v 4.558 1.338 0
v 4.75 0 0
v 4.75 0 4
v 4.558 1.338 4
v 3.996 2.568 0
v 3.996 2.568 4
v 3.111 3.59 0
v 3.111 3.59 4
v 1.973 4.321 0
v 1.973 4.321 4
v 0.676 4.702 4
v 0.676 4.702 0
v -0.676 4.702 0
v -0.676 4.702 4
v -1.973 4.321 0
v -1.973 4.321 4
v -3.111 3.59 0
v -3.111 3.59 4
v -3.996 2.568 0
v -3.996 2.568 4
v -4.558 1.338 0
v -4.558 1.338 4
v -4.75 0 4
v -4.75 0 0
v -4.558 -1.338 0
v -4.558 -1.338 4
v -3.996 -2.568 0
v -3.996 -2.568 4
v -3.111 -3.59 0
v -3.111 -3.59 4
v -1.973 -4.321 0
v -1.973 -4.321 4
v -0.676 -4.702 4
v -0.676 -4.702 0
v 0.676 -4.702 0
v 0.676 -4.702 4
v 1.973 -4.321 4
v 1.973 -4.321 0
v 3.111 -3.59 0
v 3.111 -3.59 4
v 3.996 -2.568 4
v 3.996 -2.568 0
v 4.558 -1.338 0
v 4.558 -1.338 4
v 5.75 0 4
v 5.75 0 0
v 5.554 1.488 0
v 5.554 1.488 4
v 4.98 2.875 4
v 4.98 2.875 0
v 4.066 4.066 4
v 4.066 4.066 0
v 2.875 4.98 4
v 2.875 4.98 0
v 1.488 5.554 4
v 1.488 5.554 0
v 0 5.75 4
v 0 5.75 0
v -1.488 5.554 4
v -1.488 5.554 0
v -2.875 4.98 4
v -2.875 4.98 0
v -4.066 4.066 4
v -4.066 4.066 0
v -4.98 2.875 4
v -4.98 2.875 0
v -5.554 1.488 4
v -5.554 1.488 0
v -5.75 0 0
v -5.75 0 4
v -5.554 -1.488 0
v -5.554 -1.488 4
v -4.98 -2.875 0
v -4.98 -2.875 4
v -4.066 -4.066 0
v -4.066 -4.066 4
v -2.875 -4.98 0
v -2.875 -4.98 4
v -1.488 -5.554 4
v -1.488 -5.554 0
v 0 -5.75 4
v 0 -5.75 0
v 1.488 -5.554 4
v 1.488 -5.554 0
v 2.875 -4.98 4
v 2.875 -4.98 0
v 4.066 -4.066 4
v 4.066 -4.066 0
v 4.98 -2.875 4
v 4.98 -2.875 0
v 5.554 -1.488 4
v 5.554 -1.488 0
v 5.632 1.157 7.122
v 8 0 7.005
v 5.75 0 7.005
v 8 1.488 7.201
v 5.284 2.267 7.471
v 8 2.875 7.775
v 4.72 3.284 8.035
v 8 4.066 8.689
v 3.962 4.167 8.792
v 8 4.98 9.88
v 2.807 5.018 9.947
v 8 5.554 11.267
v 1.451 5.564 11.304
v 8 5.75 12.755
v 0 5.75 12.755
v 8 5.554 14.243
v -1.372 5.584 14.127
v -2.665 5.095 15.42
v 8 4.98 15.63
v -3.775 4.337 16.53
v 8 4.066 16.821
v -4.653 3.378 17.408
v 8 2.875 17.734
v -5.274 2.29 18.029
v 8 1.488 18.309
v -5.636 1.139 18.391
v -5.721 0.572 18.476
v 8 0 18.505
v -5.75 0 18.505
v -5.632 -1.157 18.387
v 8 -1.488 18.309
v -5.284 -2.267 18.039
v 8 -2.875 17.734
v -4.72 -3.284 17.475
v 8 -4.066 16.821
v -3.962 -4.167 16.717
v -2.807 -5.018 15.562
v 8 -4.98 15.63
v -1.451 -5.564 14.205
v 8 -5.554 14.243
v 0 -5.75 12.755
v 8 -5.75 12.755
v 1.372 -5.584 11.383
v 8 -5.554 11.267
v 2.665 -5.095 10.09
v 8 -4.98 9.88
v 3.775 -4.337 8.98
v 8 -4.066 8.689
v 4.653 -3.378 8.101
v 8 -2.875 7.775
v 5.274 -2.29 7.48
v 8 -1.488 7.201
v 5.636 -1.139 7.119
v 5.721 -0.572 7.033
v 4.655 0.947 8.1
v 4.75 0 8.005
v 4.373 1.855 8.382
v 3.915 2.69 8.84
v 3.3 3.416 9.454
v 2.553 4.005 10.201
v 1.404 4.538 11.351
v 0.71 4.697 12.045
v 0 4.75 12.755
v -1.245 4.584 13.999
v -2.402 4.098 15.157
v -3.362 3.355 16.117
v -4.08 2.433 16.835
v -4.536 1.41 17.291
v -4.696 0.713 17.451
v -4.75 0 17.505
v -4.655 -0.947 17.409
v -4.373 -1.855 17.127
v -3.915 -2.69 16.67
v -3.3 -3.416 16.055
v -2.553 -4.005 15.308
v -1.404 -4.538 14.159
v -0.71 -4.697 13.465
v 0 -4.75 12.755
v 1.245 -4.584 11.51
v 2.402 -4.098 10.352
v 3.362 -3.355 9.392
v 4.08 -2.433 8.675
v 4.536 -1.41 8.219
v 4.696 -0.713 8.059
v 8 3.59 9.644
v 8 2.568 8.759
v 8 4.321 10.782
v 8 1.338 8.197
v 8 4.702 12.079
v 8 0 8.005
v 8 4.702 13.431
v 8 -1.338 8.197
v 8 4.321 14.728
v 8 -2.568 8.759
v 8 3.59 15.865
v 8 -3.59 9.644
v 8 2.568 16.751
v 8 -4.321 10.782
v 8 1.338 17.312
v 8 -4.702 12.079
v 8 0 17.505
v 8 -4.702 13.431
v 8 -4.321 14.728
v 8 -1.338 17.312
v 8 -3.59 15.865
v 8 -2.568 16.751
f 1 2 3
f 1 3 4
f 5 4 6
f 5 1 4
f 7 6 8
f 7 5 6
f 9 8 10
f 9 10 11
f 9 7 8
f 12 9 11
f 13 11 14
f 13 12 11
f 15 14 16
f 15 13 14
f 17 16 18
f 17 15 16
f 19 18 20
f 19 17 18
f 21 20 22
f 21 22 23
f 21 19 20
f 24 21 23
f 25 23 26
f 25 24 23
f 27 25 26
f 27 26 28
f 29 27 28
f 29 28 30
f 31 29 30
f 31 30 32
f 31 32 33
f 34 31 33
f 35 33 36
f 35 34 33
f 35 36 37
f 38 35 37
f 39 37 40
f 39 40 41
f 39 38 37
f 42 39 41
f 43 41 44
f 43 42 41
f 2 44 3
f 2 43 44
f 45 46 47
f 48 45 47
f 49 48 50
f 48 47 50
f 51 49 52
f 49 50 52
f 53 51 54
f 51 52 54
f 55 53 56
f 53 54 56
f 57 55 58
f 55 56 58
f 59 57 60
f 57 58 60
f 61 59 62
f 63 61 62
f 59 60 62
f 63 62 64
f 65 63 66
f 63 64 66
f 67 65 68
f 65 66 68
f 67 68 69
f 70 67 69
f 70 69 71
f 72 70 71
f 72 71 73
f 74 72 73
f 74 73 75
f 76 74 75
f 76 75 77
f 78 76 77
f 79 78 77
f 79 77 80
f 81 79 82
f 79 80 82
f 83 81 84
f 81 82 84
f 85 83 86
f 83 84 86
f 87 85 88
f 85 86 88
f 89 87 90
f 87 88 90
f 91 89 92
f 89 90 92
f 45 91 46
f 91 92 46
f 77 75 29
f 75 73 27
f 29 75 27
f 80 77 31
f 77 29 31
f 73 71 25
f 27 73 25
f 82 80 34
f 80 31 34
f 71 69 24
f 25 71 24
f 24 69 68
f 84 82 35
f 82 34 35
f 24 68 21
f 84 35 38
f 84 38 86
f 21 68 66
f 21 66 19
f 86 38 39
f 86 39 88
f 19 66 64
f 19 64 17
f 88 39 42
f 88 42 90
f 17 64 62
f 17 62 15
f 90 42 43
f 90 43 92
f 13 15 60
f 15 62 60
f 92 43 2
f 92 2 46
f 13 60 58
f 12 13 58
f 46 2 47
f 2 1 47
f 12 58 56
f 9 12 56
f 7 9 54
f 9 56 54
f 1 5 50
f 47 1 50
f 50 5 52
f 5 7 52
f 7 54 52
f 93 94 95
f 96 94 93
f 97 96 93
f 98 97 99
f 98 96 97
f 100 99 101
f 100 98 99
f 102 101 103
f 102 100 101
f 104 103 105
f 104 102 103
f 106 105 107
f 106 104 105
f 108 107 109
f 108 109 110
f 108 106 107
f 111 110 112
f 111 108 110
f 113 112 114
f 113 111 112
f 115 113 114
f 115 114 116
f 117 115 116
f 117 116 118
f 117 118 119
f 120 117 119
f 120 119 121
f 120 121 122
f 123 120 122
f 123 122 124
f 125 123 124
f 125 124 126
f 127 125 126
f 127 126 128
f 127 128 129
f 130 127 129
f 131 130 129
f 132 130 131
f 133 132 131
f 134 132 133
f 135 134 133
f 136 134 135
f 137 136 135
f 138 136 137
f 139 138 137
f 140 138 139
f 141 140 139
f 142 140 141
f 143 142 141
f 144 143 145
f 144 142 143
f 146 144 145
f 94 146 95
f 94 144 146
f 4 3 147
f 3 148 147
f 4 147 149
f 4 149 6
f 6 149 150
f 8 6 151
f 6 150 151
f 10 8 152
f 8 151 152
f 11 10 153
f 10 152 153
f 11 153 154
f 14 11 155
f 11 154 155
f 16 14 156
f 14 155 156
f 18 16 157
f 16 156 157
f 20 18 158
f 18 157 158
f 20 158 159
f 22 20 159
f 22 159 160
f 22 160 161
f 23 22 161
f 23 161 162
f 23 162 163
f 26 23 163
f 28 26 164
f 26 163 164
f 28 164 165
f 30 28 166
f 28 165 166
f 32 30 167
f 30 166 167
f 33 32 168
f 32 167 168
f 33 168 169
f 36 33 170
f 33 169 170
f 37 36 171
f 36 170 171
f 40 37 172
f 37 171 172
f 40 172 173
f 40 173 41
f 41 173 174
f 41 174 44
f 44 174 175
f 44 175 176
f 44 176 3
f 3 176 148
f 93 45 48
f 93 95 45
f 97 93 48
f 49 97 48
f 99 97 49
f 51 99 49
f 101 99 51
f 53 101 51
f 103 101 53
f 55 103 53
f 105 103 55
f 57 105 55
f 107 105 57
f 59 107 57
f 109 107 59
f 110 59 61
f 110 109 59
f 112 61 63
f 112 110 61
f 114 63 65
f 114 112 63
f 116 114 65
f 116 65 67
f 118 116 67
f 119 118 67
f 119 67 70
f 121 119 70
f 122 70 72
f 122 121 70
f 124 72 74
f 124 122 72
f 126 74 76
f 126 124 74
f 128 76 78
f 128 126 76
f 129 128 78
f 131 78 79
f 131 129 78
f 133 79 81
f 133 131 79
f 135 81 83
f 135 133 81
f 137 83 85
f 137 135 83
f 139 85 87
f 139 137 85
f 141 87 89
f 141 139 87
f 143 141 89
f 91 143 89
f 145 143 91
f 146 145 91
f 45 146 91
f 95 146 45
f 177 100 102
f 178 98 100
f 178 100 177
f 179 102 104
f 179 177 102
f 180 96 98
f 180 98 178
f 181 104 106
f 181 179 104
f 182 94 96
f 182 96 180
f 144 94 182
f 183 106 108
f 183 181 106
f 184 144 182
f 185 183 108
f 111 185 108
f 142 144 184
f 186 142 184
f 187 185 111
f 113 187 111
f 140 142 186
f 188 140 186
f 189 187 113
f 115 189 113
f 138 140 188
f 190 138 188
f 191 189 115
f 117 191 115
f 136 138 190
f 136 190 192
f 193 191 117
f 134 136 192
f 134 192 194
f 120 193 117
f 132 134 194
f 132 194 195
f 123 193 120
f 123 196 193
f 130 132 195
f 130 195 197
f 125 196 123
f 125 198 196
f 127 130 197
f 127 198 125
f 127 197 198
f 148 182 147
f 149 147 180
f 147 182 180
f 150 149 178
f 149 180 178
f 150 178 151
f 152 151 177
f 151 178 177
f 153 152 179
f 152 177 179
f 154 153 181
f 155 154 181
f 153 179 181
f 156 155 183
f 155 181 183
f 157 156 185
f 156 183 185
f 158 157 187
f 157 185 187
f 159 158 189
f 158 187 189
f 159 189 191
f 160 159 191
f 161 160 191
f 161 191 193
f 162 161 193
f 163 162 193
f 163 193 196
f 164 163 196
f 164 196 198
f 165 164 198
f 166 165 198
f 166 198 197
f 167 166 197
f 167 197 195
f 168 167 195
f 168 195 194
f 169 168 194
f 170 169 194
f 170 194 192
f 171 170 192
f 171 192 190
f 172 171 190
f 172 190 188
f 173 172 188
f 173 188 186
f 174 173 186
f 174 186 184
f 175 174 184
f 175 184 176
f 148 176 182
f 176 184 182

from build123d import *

# Parameters (mm, degrees)
F0_R        = 5.75
F0_R_2      = 4.75
F1_DEPTH    = 4
F1_FACE_R   = 5.75
F1_FACE_R_2 = 4.75


with BuildPart() as f1:
    # F0 (on Top) → F1 (new body)
    with BuildSketch(Plane.XY):
        Circle(F0_R)
        Circle(F0_R_2, mode=Mode.SUBTRACT)
    extrude(amount=F1_DEPTH)

    # F5: sweep along a path in F4
    with BuildLine(Plane.XZ) as f5_path:
        Line((0, 4), (0, 12.7547773101))
        Line((0, 12.7547773101), (8, 12.7547773101))
    # F1_face (on face) → F5 (sweep)
    with BuildSketch(Plane.XY.offset(4)):
        Circle(F1_FACE_R)
        Circle(F1_FACE_R_2, mode=Mode.SUBTRACT)
    sweep(path=f5_path.line, transition=Transition.RIGHT)


solid = f1.part
